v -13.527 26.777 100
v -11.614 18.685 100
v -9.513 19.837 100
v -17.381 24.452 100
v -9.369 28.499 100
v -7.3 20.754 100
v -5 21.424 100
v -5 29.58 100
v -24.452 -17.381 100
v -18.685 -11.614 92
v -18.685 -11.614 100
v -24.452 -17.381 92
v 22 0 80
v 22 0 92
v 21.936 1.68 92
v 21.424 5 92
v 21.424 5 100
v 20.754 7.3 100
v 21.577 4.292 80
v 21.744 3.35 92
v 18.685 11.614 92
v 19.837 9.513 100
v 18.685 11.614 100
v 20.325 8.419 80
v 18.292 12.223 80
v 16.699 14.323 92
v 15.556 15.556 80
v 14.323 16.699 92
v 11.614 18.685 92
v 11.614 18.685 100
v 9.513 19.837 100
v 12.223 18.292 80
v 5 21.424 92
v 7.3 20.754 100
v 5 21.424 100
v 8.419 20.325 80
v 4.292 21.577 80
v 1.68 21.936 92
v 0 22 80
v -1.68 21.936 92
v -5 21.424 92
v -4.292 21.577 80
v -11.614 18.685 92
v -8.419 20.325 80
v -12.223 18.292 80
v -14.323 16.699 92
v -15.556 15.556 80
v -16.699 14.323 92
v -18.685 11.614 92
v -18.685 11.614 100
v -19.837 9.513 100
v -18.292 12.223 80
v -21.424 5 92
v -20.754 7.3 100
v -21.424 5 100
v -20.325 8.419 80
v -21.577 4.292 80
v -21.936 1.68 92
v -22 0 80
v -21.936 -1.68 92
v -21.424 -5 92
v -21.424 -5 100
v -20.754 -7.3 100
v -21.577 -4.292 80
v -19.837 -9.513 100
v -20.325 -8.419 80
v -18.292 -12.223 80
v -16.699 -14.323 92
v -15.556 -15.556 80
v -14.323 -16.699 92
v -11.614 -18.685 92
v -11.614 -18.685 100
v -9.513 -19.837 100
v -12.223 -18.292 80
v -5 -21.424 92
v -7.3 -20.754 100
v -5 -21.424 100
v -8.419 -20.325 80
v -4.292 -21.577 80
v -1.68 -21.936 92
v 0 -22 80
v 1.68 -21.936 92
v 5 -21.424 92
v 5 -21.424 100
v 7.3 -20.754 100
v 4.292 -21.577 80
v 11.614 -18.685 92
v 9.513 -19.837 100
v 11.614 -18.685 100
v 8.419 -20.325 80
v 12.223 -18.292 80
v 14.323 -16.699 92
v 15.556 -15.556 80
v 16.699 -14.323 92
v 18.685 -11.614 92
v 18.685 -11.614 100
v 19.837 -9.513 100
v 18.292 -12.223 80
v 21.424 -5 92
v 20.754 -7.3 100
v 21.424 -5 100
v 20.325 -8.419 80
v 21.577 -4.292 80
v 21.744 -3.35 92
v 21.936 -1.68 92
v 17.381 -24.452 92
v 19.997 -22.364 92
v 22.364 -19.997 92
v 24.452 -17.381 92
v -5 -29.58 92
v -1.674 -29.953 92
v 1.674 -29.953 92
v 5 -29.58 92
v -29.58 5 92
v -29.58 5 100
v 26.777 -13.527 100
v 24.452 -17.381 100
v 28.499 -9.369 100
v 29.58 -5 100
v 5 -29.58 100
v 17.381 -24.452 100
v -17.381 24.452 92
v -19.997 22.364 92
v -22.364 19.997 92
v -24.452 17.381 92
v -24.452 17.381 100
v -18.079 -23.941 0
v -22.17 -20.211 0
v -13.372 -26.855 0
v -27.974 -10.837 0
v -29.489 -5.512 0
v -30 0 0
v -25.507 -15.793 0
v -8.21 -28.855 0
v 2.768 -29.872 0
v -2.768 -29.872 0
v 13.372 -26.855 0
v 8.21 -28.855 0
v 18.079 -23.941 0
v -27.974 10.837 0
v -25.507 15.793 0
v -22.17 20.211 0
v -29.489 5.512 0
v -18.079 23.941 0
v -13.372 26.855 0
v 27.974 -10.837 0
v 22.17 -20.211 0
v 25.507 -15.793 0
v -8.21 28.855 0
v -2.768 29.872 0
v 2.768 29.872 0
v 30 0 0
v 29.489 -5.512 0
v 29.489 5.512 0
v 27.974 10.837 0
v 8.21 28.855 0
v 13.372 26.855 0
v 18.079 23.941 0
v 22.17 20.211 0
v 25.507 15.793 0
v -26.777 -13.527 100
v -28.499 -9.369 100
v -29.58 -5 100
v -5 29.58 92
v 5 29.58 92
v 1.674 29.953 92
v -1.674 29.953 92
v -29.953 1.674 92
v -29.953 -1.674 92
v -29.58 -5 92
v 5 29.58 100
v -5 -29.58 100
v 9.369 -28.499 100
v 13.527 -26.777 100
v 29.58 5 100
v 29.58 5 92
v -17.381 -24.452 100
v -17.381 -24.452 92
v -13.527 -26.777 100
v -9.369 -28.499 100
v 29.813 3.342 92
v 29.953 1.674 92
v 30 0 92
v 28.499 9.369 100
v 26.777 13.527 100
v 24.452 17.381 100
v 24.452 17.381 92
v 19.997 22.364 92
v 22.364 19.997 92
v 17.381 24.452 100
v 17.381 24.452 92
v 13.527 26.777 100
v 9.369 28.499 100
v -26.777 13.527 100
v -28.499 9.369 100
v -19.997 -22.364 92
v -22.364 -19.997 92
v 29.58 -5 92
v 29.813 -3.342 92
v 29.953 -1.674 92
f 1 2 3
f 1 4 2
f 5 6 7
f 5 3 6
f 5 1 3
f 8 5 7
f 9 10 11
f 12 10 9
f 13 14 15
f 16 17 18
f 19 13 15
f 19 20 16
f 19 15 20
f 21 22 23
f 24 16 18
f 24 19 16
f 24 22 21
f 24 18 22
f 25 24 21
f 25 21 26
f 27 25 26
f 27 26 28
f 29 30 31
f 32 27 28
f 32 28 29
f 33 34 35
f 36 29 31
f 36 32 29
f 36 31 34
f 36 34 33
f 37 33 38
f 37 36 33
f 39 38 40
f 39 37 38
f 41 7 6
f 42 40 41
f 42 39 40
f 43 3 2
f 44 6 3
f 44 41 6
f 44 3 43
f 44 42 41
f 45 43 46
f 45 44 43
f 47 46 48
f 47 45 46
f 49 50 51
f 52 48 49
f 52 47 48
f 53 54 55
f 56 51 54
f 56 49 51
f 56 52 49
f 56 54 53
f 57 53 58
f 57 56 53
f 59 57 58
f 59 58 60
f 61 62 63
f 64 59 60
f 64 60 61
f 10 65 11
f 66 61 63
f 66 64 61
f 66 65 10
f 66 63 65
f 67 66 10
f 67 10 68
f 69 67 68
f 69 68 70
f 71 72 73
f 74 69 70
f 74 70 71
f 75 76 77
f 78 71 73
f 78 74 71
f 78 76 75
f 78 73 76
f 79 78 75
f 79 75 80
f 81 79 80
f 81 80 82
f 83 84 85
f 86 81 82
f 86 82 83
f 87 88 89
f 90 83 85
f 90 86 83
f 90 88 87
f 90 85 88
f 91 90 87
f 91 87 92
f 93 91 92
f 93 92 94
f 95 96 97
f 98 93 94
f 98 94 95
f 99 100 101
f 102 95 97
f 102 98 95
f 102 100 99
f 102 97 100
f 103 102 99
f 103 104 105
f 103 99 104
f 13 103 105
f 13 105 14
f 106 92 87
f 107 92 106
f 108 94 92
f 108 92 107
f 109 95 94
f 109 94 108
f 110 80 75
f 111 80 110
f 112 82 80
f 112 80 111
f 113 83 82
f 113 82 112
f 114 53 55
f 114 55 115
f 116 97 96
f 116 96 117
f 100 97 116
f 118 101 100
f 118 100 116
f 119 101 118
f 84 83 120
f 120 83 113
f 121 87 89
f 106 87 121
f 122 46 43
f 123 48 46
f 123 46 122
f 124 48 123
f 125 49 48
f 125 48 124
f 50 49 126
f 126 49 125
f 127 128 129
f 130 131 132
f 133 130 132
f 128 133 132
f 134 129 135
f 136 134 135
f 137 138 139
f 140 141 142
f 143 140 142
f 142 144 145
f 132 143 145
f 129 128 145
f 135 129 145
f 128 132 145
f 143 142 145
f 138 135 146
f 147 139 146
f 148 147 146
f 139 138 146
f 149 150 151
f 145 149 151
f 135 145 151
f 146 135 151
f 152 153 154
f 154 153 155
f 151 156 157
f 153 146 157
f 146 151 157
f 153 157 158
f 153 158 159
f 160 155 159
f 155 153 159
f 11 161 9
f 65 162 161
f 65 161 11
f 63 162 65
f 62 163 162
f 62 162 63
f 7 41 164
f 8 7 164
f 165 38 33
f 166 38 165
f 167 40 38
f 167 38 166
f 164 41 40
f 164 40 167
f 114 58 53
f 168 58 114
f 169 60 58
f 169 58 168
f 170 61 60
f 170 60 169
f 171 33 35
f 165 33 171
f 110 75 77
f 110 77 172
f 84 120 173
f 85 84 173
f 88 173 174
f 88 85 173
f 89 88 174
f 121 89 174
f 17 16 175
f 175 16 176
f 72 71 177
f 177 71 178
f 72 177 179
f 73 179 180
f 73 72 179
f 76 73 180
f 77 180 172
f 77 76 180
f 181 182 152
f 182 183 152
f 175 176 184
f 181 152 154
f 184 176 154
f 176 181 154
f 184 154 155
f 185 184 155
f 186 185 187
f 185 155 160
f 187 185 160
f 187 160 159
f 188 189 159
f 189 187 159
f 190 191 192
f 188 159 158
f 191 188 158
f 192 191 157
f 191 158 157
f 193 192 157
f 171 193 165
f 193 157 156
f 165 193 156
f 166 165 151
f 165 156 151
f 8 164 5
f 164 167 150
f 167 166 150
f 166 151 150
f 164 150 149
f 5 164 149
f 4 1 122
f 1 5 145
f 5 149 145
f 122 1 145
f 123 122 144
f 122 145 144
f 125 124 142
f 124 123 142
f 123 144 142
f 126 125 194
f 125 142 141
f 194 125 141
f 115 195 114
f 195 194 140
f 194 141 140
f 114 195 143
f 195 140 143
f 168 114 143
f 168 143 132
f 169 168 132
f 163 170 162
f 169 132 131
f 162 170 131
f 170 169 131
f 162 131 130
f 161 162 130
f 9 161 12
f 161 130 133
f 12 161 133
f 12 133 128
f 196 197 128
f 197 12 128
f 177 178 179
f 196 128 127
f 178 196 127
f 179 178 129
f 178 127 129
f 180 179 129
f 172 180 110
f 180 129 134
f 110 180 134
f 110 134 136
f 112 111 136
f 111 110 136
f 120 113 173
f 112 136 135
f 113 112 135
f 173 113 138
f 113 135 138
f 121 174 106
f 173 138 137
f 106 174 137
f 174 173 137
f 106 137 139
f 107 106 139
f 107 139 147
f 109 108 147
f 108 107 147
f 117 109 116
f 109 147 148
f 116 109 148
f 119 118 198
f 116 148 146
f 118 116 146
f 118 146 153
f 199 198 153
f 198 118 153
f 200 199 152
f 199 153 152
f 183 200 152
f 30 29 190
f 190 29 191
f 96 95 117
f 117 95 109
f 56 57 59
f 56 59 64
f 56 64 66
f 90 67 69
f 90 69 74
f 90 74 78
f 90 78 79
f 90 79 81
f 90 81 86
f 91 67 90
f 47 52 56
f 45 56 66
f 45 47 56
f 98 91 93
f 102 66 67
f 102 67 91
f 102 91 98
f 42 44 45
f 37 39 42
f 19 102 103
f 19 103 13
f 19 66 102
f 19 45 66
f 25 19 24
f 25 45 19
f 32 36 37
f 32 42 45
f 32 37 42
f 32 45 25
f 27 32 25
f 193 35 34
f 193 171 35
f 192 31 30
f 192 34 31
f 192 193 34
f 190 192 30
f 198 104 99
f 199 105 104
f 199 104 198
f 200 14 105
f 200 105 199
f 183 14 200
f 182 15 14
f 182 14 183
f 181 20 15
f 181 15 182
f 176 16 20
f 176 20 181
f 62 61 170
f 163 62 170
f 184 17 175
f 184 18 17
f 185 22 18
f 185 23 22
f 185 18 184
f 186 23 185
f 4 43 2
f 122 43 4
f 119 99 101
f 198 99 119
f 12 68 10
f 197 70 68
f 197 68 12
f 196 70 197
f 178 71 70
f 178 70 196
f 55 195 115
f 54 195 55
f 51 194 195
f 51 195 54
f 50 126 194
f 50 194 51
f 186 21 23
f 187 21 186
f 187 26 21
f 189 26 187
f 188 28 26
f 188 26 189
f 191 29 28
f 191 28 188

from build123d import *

# Parameters (mm, degrees)
CYLINDER001_R     = 22
CYLINDER001_DEPTH = 20
BOX_W             = 20
BOX_H             = 10
BOX_DEPTH         = 10
ARRAY_COUNT       = 8
CYLINDER_R        = 30
CYLINDER_DEPTH    = 100


with BuildPart() as cilindre001:
    # Cylinder001 → Cylinder001 (new body)
    with BuildSketch(Plane.XY.offset(80)):
        Circle(CYLINDER001_R)
    extrude(amount=CYLINDER001_DEPTH)


with BuildPart() as array:
    # Box → Box (new body)
    with BuildSketch(Plane(origin=(18, -5, 0), x_dir=(1, 0, 0), z_dir=(0, 0, 1))):
        with Locations((10, 5)):
            Rectangle(BOX_W, BOX_H)
    extrude(amount=BOX_DEPTH)

    # Array: Array ×8 about axis
    array_axis = Axis((0, 0, 0), (0, 0, 1))


with BuildPart() as array_1:
    add(array.part)
    for i in range(1, ARRAY_COUNT):
        add(array.part.rotate(array_axis, i * 360 / ARRAY_COUNT))


with BuildPart() as array_2:
    # Array placement: moved
    add(array_1.part.moved(Location((0, 0, 92))))


with BuildPart() as cut001:
    # Cylinder → Cylinder (new body)
    with BuildSketch(Plane.XY):
        Circle(CYLINDER_R)
    extrude(amount=CYLINDER_DEPTH)

    # Cut: cut Array
    add(array_2.part, mode=Mode.SUBTRACT)

    # Cut001: cut Cilindre001
    add(cilindre001.part, mode=Mode.SUBTRACT)


solid = cut001.part
